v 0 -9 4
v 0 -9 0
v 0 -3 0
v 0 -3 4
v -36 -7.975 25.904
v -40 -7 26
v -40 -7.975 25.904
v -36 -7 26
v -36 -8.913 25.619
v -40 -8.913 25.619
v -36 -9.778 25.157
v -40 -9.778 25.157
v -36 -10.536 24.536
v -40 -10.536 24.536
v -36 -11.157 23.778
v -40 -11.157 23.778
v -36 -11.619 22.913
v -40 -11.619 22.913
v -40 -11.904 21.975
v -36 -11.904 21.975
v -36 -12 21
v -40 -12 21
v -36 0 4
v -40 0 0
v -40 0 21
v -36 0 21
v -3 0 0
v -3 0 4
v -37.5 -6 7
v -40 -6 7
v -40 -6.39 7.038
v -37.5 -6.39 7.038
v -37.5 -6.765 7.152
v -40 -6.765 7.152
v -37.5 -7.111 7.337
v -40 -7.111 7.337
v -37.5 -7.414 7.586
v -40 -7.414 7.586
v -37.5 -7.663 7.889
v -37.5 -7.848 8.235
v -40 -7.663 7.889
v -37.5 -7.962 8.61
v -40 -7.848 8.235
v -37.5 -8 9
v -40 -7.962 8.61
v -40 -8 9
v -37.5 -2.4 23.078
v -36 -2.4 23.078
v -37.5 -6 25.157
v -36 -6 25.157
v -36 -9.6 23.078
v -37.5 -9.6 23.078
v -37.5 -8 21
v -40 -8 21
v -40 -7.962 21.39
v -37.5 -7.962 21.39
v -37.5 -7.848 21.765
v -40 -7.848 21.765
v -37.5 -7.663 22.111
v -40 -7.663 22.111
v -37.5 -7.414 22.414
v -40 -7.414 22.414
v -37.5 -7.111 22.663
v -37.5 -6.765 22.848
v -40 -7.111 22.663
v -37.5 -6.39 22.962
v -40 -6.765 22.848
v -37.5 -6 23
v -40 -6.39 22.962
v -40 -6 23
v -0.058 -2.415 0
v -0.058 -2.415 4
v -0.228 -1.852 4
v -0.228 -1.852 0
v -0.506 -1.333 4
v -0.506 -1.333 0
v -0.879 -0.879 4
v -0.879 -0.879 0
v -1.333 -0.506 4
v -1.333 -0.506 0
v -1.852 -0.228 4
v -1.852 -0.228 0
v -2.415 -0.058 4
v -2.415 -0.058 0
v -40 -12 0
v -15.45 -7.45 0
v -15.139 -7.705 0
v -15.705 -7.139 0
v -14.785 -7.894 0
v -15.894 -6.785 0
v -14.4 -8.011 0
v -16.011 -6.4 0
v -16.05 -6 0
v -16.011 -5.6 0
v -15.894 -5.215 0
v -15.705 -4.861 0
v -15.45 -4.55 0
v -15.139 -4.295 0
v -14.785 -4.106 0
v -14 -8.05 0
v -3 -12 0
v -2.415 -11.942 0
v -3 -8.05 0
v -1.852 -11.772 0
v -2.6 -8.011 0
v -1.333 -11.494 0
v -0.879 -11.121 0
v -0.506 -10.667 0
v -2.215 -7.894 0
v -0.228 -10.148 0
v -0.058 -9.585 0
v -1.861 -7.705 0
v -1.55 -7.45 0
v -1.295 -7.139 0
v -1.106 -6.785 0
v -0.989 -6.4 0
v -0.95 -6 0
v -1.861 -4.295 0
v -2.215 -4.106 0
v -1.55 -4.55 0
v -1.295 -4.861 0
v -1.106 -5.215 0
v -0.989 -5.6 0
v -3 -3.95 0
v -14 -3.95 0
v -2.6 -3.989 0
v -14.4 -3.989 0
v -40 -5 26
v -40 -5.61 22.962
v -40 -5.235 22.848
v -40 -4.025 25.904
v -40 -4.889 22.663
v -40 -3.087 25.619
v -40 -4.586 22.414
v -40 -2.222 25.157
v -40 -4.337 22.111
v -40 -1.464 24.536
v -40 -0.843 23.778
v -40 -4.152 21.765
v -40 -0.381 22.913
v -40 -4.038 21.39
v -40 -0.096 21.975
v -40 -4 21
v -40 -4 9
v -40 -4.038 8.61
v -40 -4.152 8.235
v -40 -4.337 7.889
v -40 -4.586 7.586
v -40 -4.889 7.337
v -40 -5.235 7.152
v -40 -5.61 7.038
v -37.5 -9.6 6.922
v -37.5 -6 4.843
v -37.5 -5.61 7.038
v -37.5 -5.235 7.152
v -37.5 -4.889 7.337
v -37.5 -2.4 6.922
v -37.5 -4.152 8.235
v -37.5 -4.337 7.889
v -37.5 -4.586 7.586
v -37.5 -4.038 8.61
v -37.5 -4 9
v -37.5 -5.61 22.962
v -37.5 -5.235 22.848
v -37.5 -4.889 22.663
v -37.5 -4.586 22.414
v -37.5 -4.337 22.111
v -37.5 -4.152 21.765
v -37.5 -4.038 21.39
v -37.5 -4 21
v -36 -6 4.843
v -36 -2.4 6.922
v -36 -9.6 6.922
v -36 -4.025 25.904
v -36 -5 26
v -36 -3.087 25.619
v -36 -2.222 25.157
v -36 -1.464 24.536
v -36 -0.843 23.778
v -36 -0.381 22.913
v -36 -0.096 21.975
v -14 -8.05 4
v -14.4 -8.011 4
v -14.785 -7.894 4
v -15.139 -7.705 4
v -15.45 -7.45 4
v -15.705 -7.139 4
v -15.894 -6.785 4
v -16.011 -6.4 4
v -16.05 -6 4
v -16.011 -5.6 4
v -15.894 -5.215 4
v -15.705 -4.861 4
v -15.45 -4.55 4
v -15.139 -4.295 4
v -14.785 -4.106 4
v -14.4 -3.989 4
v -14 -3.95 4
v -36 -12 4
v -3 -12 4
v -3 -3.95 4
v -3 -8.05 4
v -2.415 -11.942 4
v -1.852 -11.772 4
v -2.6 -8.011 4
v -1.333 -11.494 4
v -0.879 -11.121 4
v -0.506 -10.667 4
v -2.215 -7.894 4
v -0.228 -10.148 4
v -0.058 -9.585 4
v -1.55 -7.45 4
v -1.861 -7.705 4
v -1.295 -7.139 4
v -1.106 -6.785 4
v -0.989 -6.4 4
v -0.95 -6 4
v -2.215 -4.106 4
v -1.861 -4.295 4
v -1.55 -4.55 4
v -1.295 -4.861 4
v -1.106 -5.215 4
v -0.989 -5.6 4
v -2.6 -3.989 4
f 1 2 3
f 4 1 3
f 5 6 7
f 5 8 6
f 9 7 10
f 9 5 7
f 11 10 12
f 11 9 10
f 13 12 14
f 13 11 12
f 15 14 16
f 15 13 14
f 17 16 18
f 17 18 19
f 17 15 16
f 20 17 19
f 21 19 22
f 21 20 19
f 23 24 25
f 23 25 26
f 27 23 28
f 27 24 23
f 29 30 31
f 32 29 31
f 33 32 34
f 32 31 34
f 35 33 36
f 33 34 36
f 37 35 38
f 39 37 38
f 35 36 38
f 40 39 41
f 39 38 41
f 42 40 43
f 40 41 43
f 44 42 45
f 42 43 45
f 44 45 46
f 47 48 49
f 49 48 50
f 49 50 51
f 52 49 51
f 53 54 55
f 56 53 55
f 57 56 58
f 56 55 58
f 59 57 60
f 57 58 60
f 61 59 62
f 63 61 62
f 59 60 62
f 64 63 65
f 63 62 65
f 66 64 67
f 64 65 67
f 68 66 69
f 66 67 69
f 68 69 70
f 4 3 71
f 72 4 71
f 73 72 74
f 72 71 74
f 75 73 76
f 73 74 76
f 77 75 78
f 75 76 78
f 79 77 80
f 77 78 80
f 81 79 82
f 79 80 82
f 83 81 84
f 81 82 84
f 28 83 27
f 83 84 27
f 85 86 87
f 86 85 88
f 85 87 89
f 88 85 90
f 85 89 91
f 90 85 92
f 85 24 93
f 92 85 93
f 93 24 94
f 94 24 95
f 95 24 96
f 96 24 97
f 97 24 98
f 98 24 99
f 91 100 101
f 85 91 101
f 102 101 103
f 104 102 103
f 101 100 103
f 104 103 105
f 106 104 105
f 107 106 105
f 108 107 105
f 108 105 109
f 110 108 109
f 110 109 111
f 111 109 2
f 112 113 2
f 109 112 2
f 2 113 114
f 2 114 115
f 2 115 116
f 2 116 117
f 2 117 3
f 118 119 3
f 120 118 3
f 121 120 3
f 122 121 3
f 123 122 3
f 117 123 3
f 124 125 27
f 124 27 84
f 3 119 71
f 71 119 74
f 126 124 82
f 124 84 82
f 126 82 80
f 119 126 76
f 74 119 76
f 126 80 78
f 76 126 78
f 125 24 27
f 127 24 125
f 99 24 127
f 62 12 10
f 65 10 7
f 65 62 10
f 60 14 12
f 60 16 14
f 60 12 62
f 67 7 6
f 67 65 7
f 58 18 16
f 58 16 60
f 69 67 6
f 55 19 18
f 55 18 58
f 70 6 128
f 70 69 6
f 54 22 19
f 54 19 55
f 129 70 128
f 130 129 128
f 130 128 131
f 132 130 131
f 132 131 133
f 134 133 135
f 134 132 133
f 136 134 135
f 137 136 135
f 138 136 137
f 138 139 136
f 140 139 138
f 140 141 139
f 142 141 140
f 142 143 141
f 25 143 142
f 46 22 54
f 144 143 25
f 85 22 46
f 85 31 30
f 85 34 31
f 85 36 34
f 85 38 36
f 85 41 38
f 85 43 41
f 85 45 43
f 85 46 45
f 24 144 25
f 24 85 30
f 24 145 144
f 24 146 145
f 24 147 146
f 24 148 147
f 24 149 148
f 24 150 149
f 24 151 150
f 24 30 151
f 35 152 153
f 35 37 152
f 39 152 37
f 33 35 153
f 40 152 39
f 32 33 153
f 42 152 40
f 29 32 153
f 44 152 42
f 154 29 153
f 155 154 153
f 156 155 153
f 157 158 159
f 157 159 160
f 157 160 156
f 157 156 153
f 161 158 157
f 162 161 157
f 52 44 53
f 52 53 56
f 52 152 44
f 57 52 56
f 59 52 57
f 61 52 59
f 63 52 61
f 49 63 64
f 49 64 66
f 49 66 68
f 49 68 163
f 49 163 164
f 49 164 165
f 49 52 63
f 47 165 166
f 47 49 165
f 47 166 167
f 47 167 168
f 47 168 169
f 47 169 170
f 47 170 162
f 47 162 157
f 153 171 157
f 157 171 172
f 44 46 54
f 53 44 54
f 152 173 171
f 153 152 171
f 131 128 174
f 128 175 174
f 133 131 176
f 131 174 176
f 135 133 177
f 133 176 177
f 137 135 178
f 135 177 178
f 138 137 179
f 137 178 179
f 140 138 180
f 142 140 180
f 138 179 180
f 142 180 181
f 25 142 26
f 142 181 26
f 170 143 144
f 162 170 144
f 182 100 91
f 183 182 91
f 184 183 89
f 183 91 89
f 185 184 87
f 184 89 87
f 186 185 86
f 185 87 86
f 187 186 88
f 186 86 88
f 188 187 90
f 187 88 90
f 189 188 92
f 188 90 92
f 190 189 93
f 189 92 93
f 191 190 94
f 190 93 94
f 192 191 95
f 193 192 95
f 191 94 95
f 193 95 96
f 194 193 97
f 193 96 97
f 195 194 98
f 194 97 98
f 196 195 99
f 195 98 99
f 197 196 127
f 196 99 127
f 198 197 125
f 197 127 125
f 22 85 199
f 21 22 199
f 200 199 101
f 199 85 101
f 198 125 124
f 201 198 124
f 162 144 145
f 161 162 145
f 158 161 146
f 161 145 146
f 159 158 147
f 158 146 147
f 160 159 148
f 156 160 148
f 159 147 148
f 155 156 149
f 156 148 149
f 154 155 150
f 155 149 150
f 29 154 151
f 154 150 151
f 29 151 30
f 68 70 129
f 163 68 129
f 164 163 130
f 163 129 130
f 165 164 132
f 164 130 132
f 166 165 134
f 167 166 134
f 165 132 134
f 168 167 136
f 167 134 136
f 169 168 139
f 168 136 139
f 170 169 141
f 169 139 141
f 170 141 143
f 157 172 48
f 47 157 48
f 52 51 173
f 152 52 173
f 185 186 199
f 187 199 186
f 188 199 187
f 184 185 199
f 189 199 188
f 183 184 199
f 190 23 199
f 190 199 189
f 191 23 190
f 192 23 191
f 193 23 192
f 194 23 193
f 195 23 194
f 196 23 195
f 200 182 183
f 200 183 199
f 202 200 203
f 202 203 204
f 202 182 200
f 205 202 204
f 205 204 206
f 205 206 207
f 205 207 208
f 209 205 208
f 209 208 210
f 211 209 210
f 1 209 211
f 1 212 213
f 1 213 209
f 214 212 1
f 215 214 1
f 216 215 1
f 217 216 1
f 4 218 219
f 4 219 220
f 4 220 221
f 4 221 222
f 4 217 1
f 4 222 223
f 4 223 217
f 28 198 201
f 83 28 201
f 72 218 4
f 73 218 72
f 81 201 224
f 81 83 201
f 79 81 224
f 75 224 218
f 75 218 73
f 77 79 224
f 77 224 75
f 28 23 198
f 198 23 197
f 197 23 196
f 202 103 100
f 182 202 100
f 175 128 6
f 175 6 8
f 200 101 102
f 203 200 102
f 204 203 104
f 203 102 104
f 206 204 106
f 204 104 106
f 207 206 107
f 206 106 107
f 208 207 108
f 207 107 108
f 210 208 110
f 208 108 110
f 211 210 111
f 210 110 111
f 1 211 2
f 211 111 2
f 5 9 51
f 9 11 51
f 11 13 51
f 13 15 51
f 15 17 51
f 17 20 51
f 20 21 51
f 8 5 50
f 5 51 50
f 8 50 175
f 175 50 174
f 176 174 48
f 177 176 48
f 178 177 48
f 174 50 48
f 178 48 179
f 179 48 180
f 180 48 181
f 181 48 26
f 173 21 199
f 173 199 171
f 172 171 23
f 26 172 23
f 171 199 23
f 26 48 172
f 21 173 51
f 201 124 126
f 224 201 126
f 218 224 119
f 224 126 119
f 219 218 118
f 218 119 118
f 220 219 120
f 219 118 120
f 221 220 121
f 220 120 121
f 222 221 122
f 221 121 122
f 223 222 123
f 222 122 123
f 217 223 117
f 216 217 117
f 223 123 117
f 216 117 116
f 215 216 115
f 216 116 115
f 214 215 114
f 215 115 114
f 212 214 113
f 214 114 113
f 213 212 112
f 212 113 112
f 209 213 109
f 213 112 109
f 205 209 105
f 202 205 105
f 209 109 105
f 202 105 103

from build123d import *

# Parameters (mm, degrees)
F1_DEPTH = 4
F2_W     = 4
F2_H     = 12
F3_DEPTH = 22
F5_DEPTH = 25
F7_DEPTH = 1.5
F8_R     = 5


# Not quite as in the source:
# - a feature names something its author has since deleted; it is built from what else it names


with BuildPart() as f1:
    # F0 (on Top) → F1 (new body)
    with BuildSketch(Plane.XY):
        with BuildLine():
            ThreePointArc((0, -3), (-0.8786796564, -0.8786796564), (-3, 0))
            Line((-3, 0), (-40, 0))
            Line((-40, 0), (-40, -12))
            Line((-40, -12), (-3, -12))
            ThreePointArc((-3, -12), (-0.8786796564, -11.1213203436), (0, -9))
            Line((0, -9), (0, -3))
        make_face()
        with BuildLine():
            ThreePointArc((-3, -3.95), (-0.95, -6), (-3, -8.05))
            Line((-3, -8.05), (-14, -8.05))
            ThreePointArc((-14, -8.05), (-16.05, -6), (-14, -3.95))
            Line((-14, -3.95), (-3, -3.95))
        make_face(mode=Mode.SUBTRACT)
    extrude(amount=F1_DEPTH)

    # F2 (on face) → F3 (join)
    with BuildSketch(Plane.XY.offset(4)):
        with Locations((-38, -6)):
            Rectangle(F2_W, F2_H)
    extrude(amount=F3_DEPTH)

    # F4 (on face) → F5 (cut)
    with BuildSketch(Plane(origin=(-40, 0, 0), x_dir=(0, -1, 0), z_dir=(-1, 0, 0))):
        with BuildLine():
            Line((4, 21), (4, 9))
            ThreePointArc((4, 9), (4.5857864376, 7.5857864376), (6, 7))
            ThreePointArc((6, 7), (7.4142135624, 7.5857864376), (8, 9))
            Line((8, 9), (8, 21))
            ThreePointArc((8, 21), (7.4142135624, 22.4142135624), (6, 23))
            ThreePointArc((6, 23), (4.5857864376, 22.4142135624), (4, 21))
        make_face()
    extrude(amount=-F5_DEPTH, mode=Mode.SUBTRACT)

    # F6 (on face) → F7 (cut)
    with BuildSketch(Plane.YZ.offset(-36)):
        Polygon((-6, 4.8430780618), (-2.4, 6.9215390309), (-2.4, 23.0784609691), (-6, 25.1569219382), (-9.6, 23.0784609691), (-9.6, 6.9215390309), align=None)
        with BuildLine():
            ThreePointArc((-8, 21), (-6, 23), (-4, 21))
            Line((-4, 21), (-4, 9))
            ThreePointArc((-4, 9), (-6, 7), (-8, 9))
            Line((-8, 9), (-8, 21))
        make_face(mode=Mode.SUBTRACT)
    extrude(amount=-F7_DEPTH, mode=Mode.SUBTRACT)

    # F8
    f8_edges = [f1.edges().sort_by_distance(p)[0] for p in [
        (-38, -12, 26),
        (-38, 0, 26),
    ]]
    fillet(f8_edges, radius=F8_R)


solid = f1.part
